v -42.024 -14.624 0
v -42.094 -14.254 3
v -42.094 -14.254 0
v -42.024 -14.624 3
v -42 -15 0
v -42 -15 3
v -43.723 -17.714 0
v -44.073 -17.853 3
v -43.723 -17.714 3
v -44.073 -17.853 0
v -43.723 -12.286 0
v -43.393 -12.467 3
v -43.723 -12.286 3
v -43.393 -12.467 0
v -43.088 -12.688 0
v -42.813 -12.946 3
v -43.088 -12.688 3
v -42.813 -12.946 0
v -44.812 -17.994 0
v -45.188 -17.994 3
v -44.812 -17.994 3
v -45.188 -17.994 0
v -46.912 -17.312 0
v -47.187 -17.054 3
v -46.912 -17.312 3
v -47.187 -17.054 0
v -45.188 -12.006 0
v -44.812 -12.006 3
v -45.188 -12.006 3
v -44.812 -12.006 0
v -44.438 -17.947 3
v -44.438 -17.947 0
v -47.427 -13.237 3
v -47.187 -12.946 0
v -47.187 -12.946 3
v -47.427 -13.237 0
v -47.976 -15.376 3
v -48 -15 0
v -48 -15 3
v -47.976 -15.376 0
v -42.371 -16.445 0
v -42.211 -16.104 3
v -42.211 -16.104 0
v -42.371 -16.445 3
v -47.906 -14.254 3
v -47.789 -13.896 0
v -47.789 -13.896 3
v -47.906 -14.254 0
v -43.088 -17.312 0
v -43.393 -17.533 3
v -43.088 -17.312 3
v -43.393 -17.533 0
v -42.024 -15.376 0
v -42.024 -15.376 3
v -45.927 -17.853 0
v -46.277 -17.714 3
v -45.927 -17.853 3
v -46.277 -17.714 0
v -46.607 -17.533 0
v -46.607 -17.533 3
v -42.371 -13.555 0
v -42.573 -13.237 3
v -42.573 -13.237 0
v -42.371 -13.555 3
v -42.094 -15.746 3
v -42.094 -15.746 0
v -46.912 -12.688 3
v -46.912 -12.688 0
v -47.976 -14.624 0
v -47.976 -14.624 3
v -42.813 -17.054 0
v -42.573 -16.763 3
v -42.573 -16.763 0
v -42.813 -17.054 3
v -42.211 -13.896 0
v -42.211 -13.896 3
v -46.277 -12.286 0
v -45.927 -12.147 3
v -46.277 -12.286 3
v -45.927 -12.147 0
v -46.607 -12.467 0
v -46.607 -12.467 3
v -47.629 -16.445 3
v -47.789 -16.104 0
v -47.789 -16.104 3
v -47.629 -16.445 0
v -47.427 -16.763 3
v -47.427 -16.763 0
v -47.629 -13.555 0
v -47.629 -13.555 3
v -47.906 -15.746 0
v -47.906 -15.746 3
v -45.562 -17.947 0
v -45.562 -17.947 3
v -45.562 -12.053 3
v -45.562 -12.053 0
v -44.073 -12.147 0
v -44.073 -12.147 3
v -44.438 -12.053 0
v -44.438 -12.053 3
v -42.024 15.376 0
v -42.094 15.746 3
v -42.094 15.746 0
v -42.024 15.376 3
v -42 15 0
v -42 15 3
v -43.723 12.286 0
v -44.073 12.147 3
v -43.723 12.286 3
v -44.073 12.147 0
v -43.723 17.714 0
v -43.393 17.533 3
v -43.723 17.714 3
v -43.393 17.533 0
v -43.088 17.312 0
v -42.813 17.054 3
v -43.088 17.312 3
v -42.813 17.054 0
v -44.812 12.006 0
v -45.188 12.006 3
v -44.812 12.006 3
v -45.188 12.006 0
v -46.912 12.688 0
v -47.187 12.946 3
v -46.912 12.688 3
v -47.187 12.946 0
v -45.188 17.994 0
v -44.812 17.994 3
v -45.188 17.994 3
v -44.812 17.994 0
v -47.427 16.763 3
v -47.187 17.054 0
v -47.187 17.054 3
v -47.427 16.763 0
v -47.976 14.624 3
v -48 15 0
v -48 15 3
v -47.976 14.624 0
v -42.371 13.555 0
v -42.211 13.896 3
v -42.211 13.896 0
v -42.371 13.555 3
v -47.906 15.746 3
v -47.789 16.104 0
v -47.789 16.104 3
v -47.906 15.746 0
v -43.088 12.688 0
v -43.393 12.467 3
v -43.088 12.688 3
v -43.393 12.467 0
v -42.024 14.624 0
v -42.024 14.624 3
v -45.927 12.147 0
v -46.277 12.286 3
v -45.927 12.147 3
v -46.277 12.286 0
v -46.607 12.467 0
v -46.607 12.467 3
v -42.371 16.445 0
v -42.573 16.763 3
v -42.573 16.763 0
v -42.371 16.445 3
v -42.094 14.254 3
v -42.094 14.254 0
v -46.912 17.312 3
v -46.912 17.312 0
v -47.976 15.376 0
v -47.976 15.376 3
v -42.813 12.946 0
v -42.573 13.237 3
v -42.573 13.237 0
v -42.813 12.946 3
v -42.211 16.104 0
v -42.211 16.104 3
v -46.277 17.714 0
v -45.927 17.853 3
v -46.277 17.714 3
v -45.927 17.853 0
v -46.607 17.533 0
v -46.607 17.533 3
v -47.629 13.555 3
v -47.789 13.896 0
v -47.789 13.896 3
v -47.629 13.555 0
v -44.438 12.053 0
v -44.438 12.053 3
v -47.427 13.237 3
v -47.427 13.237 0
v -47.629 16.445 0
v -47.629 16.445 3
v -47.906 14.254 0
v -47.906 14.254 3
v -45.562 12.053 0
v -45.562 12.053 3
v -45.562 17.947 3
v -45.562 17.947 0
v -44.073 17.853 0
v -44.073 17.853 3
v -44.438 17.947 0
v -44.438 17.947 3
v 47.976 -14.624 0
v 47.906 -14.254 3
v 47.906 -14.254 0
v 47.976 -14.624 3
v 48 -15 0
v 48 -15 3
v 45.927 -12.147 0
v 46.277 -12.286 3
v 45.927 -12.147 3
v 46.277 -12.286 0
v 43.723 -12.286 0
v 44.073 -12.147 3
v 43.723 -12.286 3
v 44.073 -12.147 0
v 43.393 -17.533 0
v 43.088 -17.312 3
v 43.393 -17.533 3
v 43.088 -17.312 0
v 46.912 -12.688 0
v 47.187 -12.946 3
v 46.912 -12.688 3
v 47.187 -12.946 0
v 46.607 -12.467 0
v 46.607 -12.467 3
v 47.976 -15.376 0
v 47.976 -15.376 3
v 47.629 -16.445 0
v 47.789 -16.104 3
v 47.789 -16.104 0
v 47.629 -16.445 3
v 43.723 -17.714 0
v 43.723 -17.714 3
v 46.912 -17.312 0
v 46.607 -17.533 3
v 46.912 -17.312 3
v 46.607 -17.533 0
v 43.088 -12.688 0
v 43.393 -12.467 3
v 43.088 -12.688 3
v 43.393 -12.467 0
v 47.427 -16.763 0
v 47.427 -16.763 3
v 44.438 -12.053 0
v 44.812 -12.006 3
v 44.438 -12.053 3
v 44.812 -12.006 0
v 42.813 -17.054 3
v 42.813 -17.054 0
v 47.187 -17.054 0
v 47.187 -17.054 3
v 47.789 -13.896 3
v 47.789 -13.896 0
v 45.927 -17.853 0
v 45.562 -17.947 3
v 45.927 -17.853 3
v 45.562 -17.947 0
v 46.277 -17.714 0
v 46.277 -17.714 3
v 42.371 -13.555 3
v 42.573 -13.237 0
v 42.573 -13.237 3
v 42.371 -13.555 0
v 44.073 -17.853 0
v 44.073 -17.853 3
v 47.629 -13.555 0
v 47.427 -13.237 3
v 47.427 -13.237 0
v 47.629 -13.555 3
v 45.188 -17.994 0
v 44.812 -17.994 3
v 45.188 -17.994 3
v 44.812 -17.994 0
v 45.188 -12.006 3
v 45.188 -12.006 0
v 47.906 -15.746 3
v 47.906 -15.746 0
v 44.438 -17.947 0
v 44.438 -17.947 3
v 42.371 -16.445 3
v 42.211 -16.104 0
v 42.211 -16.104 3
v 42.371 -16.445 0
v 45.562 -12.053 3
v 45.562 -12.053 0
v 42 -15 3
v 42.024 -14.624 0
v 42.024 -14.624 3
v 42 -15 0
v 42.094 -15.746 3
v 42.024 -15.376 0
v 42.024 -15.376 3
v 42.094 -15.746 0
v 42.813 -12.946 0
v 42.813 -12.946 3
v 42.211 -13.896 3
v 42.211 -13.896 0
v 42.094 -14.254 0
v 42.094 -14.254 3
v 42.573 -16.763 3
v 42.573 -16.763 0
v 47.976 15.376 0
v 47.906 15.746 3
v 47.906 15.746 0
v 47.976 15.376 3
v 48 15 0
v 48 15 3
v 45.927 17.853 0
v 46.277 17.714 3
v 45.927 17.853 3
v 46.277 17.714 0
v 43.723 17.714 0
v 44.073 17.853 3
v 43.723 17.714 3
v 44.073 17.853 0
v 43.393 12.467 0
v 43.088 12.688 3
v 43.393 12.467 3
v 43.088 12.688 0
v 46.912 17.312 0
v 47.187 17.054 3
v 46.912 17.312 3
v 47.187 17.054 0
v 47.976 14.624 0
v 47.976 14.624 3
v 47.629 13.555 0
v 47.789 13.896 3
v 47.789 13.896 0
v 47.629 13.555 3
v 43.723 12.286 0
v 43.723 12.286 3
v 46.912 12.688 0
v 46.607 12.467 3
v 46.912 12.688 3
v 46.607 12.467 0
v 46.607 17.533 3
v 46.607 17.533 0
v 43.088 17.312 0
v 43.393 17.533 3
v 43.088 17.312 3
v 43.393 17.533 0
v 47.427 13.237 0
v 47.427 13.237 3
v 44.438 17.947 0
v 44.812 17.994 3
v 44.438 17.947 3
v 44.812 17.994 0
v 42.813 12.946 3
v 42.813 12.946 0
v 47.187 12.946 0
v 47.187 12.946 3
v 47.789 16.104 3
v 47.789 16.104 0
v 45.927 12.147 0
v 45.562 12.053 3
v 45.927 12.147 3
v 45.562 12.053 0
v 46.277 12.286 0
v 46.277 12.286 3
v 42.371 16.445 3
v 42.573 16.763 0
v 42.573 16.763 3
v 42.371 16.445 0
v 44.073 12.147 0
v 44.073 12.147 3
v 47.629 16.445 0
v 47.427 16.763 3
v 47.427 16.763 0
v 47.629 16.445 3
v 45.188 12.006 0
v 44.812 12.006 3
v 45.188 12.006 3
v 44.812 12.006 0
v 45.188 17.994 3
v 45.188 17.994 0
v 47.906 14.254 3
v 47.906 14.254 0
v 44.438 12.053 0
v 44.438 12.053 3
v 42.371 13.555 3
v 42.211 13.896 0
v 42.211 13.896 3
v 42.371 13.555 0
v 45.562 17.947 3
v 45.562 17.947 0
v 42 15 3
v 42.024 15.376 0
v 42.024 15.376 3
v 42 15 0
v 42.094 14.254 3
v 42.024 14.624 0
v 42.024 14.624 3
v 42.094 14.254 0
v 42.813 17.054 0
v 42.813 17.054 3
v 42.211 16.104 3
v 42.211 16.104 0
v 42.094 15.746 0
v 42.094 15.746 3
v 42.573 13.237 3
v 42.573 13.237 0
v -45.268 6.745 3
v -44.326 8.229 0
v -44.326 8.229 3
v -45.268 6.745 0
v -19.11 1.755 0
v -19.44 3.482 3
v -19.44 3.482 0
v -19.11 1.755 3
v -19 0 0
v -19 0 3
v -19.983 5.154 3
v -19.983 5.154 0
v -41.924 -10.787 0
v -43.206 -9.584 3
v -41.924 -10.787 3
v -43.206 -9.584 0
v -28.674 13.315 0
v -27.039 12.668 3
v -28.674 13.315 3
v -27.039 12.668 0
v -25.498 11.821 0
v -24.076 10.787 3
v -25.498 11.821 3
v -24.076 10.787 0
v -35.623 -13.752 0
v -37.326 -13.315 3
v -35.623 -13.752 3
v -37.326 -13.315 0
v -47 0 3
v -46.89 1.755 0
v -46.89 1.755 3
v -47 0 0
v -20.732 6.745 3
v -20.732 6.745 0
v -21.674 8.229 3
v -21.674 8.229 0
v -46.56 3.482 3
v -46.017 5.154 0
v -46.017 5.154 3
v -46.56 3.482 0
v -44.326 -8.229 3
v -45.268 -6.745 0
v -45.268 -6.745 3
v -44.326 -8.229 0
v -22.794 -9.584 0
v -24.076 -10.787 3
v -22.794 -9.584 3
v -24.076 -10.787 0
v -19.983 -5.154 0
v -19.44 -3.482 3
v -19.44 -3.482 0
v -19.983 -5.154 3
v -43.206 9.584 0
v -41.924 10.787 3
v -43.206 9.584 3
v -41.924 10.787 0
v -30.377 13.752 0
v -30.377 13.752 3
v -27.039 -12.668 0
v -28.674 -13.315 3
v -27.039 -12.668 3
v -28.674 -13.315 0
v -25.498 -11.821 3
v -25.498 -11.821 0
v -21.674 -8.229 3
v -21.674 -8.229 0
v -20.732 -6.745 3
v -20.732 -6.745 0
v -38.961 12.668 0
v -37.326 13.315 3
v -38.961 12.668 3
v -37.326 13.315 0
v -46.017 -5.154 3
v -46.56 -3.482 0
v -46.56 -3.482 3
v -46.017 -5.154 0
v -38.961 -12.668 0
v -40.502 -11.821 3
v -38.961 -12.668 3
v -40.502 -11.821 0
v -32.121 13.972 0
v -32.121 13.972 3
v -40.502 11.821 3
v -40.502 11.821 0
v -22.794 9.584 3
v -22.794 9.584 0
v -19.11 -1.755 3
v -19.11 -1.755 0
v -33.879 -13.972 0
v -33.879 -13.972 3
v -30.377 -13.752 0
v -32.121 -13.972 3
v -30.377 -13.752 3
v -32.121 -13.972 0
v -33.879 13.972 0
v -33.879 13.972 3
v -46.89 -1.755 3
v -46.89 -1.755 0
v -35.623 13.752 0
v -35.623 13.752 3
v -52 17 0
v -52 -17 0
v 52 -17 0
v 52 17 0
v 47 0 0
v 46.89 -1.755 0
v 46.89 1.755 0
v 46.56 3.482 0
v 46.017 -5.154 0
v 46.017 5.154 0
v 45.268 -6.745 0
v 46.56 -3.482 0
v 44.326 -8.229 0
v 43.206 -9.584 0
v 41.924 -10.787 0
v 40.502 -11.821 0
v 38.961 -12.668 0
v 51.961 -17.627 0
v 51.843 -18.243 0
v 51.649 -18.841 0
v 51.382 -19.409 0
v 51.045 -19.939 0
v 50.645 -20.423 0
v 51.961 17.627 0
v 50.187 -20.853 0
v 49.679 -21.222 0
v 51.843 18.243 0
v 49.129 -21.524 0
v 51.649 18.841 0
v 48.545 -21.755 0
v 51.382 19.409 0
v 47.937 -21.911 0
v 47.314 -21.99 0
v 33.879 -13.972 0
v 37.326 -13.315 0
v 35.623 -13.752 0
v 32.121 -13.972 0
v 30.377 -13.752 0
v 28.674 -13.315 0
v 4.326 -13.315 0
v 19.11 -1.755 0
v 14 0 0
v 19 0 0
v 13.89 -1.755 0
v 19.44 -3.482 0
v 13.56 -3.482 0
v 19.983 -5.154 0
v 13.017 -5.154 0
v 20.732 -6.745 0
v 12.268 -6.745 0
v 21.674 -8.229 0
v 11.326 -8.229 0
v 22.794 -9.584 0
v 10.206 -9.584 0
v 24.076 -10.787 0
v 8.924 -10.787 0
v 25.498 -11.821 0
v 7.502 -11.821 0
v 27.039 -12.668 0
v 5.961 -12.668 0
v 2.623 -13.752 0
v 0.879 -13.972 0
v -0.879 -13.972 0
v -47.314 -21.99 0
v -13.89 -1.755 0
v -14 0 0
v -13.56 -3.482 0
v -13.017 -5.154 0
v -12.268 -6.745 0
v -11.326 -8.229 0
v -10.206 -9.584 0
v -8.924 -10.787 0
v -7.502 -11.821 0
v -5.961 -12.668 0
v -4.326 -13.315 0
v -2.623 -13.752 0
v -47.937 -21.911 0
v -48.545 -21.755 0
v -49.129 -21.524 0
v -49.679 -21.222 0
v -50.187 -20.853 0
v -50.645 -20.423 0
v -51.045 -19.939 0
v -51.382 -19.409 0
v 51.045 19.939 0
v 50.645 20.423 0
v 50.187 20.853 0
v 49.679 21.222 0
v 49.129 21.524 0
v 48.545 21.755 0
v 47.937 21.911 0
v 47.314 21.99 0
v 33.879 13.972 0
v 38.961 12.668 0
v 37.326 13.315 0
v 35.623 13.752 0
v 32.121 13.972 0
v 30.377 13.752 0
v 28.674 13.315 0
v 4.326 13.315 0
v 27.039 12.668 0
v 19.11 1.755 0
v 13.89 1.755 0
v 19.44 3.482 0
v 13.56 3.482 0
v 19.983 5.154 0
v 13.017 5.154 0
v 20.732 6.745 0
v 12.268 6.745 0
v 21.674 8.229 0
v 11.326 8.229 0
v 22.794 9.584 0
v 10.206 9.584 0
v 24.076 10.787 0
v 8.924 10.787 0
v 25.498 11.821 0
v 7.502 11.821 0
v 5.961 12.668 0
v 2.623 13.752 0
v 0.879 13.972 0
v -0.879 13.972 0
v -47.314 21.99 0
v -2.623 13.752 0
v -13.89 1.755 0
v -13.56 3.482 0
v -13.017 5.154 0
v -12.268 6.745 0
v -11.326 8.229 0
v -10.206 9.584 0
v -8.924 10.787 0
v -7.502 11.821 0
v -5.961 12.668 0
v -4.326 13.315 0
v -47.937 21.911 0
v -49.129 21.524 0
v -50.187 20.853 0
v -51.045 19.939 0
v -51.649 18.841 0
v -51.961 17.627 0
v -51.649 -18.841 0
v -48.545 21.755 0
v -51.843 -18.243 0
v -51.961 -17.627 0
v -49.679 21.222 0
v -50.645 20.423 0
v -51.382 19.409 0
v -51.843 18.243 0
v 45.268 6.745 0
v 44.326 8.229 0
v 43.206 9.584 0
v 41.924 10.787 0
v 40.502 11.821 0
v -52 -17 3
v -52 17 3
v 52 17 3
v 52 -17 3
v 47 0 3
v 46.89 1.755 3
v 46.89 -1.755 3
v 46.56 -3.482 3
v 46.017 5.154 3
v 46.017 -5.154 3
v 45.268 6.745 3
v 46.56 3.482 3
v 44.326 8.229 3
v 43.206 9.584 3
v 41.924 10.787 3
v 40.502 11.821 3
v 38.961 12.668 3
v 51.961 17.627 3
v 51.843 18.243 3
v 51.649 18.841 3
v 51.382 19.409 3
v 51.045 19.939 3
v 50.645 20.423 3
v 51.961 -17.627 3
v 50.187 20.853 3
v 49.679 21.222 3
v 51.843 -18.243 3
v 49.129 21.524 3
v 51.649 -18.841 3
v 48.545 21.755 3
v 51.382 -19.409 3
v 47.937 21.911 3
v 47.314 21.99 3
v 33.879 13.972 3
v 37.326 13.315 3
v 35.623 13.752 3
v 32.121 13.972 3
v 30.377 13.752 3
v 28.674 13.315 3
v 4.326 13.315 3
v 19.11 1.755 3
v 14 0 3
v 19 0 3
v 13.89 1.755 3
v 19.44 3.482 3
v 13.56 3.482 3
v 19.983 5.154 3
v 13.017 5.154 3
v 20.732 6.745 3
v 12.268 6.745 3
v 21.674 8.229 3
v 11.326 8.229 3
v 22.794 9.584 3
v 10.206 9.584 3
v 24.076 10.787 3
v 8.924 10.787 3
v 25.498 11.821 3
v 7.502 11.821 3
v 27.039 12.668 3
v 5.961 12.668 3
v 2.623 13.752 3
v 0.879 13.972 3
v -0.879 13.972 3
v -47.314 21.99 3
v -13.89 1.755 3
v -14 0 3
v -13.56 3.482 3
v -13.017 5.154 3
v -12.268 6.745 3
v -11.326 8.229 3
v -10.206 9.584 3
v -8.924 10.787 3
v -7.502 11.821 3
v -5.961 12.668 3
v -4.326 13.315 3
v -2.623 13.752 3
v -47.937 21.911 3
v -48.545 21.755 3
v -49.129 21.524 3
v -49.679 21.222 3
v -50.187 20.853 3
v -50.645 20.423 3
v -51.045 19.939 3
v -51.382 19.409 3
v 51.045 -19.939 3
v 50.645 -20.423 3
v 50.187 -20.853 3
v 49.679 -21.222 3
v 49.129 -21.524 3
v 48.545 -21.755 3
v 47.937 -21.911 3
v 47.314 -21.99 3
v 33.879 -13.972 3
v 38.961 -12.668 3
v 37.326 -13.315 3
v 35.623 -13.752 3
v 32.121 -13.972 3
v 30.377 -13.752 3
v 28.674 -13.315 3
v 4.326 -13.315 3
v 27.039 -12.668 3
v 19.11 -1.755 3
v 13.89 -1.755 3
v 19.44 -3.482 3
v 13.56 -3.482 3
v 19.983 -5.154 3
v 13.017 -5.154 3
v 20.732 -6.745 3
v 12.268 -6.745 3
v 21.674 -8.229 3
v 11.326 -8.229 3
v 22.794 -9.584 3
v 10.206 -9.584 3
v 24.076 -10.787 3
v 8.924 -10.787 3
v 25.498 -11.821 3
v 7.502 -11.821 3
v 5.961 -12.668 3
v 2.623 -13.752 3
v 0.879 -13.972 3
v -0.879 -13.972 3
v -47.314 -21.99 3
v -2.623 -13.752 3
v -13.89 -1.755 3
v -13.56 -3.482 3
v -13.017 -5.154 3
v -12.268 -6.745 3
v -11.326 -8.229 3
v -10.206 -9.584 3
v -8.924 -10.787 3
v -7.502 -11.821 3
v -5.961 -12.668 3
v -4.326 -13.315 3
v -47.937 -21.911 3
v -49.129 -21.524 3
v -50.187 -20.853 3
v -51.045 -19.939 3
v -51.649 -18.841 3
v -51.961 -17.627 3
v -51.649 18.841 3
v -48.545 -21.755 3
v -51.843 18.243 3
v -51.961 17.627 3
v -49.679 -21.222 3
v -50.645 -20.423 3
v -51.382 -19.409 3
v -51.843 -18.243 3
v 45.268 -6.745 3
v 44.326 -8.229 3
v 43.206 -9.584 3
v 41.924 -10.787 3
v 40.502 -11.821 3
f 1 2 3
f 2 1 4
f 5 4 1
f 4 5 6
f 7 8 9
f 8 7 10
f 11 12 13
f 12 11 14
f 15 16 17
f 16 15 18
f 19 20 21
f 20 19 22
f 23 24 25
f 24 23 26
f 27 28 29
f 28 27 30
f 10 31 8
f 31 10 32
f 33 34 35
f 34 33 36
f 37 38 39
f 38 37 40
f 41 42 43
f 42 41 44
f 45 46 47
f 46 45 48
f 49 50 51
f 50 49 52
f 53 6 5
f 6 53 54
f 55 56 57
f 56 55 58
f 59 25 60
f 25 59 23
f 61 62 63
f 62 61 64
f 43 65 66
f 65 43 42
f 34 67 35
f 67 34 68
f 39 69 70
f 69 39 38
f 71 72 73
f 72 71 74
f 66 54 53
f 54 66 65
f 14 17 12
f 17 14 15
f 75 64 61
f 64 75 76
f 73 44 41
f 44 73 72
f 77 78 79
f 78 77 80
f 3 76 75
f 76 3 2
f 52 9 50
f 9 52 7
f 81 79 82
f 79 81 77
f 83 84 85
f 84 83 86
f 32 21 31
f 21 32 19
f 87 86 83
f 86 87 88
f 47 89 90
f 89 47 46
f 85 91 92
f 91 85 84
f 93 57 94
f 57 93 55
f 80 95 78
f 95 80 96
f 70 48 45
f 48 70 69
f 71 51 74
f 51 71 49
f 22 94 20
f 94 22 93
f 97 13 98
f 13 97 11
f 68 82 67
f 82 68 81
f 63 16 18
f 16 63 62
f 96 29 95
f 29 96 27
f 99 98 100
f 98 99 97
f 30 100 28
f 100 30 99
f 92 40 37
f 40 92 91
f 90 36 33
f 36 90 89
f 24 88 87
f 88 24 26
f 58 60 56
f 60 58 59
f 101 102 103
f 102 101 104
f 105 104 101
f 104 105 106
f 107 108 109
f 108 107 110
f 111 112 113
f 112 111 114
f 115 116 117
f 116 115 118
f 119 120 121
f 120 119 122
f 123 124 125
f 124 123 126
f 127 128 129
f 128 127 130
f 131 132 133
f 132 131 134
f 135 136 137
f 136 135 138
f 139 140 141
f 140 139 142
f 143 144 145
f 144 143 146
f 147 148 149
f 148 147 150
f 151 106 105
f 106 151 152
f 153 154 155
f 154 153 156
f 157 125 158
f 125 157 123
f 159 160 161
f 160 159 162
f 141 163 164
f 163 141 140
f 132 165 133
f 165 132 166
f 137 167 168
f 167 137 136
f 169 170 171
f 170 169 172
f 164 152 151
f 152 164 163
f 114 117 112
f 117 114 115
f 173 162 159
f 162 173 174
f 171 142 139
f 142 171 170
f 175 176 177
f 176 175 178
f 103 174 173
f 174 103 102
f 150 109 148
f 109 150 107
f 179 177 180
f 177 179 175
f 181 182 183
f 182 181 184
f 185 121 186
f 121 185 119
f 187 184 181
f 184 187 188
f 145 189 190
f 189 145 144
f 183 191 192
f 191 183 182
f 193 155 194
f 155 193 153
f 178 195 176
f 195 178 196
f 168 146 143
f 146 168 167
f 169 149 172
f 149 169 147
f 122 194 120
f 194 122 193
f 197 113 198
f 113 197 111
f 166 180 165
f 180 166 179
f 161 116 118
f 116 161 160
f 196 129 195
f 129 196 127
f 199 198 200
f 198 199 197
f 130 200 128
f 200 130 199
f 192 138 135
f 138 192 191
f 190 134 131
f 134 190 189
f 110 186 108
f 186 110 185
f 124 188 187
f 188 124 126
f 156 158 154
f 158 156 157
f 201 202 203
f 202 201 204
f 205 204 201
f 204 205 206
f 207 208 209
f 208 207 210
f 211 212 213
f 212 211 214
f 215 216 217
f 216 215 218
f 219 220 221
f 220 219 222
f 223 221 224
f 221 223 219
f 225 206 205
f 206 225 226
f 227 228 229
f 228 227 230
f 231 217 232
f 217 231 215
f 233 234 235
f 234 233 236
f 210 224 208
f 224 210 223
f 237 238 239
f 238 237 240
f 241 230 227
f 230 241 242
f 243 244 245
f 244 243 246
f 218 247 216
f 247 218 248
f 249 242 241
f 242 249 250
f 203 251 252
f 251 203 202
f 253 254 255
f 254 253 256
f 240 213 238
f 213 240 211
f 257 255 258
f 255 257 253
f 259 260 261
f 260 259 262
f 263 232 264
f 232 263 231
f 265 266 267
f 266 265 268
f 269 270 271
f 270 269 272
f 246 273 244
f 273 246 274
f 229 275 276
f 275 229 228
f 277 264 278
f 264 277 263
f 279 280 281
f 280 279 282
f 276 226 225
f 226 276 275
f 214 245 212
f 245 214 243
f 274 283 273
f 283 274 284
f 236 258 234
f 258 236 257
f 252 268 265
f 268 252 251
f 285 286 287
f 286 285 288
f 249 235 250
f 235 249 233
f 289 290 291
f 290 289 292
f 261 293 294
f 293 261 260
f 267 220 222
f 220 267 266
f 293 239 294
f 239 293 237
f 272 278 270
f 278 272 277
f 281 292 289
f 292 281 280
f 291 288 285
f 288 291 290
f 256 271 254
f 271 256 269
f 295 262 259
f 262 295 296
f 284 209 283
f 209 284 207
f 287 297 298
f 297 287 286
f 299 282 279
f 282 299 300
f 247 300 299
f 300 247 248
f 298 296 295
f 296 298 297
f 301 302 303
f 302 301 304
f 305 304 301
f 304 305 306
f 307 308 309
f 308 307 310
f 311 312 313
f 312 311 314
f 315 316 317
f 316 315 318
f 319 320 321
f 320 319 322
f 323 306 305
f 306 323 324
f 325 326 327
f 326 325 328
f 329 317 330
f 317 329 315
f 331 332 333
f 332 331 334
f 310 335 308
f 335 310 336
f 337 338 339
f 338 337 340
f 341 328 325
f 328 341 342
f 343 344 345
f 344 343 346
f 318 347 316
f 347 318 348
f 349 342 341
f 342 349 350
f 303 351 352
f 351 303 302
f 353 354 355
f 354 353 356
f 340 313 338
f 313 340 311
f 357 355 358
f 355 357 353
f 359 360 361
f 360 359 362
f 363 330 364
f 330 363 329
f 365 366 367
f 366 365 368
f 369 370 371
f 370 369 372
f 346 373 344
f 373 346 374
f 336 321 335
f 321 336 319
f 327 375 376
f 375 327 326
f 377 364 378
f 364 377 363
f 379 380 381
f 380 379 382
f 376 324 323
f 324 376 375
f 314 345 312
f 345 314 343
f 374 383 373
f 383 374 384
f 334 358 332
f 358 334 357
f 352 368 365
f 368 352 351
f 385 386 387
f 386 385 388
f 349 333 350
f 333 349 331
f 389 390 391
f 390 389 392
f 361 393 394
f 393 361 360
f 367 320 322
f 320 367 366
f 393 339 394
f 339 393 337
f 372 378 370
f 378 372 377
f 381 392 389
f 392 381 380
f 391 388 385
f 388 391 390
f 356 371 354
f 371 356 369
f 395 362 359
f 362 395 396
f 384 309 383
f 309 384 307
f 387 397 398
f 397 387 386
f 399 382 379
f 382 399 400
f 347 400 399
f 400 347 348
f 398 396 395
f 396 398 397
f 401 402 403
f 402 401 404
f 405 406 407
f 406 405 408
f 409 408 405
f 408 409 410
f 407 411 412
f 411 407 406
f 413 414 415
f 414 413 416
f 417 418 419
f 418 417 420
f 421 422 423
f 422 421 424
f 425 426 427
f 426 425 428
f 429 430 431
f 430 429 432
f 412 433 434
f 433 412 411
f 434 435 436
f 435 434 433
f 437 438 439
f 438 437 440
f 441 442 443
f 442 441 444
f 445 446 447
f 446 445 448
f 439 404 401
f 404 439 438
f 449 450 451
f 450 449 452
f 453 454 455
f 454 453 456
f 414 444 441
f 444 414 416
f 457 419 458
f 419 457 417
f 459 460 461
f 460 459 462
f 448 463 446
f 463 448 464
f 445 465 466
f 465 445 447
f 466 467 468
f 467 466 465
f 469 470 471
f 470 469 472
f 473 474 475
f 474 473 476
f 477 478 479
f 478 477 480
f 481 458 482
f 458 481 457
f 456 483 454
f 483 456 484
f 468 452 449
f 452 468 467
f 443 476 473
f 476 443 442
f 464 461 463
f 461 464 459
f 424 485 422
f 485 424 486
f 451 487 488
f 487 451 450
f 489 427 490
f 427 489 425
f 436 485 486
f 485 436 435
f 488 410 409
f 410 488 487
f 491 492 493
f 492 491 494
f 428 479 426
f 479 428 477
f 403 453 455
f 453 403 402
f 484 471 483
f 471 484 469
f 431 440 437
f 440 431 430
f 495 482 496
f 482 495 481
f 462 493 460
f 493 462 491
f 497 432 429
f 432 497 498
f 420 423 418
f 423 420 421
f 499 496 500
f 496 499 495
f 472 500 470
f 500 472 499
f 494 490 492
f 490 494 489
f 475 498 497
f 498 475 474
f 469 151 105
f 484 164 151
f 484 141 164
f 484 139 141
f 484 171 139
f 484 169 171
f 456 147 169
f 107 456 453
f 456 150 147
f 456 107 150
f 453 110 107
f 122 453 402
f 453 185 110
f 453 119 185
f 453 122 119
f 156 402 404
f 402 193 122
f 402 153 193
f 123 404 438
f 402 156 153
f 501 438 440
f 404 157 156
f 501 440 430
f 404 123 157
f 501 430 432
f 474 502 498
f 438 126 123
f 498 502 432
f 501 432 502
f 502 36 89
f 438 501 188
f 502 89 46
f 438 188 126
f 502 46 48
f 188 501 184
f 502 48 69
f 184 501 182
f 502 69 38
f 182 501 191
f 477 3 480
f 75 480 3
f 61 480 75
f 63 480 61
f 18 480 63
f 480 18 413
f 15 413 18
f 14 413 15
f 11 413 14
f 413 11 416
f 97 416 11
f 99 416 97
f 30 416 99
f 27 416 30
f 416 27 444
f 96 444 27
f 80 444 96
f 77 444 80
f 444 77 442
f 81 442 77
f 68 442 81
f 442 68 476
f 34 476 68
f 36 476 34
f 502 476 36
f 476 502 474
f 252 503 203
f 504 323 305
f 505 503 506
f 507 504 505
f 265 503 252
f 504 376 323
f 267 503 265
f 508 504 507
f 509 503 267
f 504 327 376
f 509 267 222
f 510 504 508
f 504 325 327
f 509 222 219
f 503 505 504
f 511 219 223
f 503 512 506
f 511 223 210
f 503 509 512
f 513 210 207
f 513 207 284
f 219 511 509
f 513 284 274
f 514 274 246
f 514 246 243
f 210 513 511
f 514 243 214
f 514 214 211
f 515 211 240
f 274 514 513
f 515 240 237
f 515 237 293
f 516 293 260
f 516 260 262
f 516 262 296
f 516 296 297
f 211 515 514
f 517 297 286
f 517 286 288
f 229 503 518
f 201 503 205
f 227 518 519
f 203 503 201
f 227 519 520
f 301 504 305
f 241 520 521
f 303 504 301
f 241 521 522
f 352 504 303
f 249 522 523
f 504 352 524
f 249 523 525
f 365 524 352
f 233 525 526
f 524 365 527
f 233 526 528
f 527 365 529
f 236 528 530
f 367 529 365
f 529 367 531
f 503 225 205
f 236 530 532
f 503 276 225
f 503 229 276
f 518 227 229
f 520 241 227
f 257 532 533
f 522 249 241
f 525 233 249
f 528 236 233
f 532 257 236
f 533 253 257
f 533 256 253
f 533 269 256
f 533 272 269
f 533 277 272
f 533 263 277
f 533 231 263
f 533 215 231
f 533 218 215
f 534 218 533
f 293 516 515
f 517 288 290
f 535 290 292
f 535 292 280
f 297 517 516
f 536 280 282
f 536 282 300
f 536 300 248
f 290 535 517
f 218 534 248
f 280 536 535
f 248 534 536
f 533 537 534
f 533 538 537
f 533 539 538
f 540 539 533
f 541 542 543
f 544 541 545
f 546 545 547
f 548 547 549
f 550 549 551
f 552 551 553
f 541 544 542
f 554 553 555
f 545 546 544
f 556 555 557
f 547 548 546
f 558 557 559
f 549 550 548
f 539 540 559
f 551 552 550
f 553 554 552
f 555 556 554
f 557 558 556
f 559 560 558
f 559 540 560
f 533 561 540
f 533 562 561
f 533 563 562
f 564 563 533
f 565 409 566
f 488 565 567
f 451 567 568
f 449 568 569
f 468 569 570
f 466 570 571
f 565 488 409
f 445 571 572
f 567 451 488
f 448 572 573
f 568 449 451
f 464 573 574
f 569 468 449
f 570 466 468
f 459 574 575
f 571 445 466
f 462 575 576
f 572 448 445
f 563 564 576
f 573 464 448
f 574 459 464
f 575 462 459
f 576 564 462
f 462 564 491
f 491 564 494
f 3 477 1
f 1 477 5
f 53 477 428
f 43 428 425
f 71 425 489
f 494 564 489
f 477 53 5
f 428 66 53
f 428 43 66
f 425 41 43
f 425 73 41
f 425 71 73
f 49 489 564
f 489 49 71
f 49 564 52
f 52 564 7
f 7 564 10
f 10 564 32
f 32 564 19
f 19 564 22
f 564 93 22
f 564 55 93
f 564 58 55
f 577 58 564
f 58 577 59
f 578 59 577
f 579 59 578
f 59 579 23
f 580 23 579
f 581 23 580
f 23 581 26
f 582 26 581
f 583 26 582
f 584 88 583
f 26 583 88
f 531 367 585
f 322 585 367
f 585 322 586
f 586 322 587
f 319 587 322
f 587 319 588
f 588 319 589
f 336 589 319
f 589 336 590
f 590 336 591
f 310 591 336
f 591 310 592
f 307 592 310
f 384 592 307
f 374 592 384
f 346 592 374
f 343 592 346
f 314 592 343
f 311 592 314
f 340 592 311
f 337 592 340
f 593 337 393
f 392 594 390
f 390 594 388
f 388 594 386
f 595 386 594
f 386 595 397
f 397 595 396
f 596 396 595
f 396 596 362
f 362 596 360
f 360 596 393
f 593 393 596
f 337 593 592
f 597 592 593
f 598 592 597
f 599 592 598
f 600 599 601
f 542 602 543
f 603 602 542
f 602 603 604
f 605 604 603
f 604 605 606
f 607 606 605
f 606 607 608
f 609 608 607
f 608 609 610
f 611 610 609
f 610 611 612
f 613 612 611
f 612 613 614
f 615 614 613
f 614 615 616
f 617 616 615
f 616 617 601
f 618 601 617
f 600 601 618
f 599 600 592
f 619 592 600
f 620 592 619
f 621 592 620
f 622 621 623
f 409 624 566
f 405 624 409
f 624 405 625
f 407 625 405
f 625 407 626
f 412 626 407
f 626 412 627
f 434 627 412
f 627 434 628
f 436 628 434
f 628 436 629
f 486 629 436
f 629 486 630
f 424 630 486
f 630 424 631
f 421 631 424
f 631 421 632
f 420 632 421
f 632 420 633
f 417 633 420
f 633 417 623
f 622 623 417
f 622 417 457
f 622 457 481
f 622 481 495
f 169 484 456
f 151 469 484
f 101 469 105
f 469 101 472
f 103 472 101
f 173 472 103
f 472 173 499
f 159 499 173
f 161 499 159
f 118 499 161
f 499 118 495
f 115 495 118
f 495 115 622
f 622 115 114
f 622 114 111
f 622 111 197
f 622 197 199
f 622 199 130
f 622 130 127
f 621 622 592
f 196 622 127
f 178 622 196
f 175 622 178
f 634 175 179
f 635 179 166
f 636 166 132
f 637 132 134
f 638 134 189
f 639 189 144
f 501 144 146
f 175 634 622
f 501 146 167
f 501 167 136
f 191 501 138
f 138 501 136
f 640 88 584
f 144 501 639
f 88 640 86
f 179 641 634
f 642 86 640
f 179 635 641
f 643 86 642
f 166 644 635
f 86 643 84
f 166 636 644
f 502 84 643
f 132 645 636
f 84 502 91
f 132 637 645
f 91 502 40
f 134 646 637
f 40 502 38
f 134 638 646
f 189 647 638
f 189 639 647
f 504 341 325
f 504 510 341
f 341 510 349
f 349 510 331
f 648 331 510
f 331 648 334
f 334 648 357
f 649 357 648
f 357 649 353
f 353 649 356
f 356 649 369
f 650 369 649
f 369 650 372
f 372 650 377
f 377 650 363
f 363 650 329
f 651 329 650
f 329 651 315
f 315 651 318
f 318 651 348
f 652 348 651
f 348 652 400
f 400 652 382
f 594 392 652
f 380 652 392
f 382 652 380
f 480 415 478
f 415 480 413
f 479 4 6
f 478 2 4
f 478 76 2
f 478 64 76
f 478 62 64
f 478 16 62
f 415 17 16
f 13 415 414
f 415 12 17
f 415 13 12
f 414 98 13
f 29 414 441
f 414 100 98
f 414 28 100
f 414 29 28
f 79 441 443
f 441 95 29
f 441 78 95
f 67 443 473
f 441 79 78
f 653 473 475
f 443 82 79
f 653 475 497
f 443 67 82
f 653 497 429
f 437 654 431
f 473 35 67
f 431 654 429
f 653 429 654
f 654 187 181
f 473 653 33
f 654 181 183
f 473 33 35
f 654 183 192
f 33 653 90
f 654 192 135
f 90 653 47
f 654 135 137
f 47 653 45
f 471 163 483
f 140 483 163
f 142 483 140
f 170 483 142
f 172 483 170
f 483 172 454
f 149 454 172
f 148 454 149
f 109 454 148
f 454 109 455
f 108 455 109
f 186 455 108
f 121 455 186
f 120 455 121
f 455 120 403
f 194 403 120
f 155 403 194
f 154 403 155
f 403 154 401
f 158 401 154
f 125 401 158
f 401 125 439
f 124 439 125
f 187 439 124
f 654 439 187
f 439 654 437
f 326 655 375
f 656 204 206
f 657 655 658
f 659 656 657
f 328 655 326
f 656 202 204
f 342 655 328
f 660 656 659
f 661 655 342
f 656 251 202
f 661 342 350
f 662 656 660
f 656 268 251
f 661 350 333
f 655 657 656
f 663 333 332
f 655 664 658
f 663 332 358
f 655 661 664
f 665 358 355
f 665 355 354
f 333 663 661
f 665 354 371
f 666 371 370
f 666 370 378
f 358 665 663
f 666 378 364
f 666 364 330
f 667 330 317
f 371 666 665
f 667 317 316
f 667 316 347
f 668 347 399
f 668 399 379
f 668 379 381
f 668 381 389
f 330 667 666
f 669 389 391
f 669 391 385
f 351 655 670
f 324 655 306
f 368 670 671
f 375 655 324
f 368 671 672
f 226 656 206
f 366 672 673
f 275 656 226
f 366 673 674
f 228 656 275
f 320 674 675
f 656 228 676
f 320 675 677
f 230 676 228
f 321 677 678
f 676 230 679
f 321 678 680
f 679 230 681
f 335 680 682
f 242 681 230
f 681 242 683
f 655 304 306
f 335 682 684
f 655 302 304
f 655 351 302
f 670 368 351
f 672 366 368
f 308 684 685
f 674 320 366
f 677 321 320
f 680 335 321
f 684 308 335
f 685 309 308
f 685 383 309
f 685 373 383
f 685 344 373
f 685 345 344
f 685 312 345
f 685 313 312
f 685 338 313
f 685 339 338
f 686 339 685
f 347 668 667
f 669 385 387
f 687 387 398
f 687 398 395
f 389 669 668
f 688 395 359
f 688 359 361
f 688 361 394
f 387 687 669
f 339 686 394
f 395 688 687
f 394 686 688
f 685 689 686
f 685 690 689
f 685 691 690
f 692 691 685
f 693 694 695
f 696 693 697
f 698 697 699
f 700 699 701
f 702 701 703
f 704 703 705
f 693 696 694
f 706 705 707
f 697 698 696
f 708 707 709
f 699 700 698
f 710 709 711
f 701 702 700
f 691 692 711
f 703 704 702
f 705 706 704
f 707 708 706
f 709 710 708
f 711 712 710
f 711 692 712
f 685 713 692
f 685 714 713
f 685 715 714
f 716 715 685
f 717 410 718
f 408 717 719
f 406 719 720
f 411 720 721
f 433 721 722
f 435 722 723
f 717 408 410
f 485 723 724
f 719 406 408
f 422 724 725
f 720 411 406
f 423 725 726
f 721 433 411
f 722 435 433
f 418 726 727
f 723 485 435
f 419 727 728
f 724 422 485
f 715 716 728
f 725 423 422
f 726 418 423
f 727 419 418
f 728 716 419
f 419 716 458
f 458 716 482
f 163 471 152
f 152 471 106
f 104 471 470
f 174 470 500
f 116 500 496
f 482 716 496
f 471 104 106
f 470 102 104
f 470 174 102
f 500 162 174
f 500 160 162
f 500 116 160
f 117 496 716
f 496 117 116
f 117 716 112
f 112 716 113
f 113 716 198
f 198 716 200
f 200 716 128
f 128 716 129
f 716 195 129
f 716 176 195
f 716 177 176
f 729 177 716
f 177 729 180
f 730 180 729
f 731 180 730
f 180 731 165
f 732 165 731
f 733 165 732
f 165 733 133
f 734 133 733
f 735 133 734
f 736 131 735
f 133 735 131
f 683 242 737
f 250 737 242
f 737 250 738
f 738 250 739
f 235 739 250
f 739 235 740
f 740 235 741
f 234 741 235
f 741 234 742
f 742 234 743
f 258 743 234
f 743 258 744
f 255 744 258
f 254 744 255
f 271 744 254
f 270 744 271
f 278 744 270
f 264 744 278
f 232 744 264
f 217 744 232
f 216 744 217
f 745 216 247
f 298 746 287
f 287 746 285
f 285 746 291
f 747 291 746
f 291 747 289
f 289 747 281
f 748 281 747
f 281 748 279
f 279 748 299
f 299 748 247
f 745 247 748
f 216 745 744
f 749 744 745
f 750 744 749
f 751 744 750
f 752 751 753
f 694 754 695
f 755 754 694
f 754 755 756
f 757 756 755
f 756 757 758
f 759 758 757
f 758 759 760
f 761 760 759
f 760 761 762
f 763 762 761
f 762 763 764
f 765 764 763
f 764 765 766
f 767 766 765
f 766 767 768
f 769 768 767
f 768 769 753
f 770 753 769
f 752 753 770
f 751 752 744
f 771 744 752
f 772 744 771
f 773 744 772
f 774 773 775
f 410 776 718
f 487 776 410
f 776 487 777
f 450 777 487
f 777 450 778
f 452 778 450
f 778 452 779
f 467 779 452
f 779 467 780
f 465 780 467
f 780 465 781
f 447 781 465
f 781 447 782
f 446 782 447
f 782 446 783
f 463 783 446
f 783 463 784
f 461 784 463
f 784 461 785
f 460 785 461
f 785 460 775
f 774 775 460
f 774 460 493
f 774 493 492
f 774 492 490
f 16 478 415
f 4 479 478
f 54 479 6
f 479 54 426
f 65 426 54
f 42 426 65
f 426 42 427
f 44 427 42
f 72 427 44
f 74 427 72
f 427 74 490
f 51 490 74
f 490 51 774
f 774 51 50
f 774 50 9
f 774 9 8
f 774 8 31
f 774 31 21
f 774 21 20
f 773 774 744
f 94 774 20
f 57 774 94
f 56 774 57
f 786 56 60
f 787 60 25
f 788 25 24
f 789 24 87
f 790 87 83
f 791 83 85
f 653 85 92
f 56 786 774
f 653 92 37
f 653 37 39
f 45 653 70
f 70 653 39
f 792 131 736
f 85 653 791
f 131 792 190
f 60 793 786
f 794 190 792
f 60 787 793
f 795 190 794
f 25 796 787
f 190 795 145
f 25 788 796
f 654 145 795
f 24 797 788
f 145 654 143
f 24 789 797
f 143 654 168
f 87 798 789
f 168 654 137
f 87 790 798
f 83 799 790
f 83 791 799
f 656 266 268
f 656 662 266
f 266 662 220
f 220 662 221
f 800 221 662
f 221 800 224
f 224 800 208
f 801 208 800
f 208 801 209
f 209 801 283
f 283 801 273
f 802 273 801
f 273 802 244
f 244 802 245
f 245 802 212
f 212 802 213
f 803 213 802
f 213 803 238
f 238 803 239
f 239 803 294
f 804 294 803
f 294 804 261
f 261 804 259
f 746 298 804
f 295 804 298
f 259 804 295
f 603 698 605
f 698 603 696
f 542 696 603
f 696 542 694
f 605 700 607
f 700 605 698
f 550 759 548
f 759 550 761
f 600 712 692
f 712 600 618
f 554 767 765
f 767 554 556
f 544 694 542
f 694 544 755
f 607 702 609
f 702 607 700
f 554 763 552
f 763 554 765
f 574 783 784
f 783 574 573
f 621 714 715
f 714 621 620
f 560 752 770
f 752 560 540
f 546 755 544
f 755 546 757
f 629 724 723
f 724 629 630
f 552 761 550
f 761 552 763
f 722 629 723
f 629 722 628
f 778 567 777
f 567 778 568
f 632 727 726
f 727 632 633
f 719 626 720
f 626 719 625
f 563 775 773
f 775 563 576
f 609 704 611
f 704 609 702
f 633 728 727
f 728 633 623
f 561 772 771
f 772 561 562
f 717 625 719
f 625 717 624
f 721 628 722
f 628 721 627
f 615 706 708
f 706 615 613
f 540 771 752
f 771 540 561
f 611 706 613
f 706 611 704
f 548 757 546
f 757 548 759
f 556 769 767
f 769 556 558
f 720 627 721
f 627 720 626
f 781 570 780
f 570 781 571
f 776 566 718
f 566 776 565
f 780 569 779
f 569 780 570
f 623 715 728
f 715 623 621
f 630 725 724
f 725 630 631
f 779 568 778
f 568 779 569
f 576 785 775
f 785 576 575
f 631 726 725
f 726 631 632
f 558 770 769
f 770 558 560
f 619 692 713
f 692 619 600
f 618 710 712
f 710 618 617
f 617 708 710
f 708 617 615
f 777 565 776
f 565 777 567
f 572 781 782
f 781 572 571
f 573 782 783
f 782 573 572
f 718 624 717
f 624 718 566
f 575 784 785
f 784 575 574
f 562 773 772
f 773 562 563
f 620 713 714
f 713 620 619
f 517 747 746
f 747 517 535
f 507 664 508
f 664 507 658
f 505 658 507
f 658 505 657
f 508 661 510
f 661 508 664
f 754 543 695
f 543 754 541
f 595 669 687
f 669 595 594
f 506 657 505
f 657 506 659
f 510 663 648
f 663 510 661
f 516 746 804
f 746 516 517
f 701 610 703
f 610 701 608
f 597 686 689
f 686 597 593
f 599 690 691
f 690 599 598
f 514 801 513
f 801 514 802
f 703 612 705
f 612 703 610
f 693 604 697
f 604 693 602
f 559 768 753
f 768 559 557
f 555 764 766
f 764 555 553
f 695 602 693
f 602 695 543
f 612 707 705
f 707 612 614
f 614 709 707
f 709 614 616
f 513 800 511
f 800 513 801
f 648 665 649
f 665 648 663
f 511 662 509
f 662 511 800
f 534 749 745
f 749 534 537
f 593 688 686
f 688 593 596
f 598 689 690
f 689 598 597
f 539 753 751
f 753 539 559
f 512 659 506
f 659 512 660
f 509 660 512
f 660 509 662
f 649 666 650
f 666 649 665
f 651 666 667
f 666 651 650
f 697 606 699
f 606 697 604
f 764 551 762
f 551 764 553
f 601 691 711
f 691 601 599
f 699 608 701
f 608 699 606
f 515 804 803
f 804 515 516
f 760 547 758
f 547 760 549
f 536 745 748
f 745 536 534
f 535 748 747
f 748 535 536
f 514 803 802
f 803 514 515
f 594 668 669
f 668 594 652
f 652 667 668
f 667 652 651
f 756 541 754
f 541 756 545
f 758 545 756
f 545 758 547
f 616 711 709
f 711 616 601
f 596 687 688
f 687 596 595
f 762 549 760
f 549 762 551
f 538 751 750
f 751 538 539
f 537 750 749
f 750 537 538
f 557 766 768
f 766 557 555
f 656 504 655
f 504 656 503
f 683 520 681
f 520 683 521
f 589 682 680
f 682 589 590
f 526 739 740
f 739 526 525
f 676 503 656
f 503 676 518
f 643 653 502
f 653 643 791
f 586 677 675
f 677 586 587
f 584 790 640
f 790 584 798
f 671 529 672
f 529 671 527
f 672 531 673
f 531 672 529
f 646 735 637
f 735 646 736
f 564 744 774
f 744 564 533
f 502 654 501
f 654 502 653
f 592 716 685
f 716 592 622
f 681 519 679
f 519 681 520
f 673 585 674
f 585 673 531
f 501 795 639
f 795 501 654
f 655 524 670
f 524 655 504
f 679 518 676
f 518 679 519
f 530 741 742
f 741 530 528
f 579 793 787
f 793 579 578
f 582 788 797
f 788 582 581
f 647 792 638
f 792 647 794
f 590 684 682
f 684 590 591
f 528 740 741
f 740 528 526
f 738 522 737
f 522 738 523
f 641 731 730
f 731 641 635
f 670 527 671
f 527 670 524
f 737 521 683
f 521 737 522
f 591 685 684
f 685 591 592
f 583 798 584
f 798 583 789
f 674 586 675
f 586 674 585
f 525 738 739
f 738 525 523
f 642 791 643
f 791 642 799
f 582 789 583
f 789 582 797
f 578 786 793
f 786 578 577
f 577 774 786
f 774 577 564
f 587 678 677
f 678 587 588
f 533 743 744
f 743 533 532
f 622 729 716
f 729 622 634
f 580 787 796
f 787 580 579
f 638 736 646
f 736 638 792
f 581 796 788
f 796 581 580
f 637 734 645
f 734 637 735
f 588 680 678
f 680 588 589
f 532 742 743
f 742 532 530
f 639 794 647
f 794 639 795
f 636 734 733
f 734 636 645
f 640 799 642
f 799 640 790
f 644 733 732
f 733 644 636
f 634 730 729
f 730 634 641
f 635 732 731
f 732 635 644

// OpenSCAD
$fn = 50;


difference() {
	union() {
		hull() {
			translate(v = [-47.0000000000, 17.0000000000, 0]) {
				cylinder(h = 3, r = 5);
			}
			translate(v = [47.0000000000, 17.0000000000, 0]) {
				cylinder(h = 3, r = 5);
			}
			translate(v = [-47.0000000000, -17.0000000000, 0]) {
				cylinder(h = 3, r = 5);
			}
			translate(v = [47.0000000000, -17.0000000000, 0]) {
				cylinder(h = 3, r = 5);
			}
		}
	}
	union() {
		#translate(v = [-45.0000000000, -15.0000000000, -100.0000000000]) {
			cylinder(h = 200, r = 3.0000000000);
		}
		#translate(v = [-45.0000000000, 15.0000000000, -100.0000000000]) {
			cylinder(h = 200, r = 3.0000000000);
		}
		#translate(v = [45.0000000000, -15.0000000000, -100.0000000000]) {
			cylinder(h = 200, r = 3.0000000000);
		}
		#translate(v = [45.0000000000, 15.0000000000, -100.0000000000]) {
			cylinder(h = 200, r = 3.0000000000);
		}
		#translate(v = [-33.0000000000, 0, 0]) {
			cylinder(h = 3, r = 14.0000000000);
		}
		#cylinder(h = 3, r = 14.0000000000);
		#translate(v = [33.0000000000, 0, 0]) {
			cylinder(h = 3, r = 14.0000000000);
		}
	}
}
